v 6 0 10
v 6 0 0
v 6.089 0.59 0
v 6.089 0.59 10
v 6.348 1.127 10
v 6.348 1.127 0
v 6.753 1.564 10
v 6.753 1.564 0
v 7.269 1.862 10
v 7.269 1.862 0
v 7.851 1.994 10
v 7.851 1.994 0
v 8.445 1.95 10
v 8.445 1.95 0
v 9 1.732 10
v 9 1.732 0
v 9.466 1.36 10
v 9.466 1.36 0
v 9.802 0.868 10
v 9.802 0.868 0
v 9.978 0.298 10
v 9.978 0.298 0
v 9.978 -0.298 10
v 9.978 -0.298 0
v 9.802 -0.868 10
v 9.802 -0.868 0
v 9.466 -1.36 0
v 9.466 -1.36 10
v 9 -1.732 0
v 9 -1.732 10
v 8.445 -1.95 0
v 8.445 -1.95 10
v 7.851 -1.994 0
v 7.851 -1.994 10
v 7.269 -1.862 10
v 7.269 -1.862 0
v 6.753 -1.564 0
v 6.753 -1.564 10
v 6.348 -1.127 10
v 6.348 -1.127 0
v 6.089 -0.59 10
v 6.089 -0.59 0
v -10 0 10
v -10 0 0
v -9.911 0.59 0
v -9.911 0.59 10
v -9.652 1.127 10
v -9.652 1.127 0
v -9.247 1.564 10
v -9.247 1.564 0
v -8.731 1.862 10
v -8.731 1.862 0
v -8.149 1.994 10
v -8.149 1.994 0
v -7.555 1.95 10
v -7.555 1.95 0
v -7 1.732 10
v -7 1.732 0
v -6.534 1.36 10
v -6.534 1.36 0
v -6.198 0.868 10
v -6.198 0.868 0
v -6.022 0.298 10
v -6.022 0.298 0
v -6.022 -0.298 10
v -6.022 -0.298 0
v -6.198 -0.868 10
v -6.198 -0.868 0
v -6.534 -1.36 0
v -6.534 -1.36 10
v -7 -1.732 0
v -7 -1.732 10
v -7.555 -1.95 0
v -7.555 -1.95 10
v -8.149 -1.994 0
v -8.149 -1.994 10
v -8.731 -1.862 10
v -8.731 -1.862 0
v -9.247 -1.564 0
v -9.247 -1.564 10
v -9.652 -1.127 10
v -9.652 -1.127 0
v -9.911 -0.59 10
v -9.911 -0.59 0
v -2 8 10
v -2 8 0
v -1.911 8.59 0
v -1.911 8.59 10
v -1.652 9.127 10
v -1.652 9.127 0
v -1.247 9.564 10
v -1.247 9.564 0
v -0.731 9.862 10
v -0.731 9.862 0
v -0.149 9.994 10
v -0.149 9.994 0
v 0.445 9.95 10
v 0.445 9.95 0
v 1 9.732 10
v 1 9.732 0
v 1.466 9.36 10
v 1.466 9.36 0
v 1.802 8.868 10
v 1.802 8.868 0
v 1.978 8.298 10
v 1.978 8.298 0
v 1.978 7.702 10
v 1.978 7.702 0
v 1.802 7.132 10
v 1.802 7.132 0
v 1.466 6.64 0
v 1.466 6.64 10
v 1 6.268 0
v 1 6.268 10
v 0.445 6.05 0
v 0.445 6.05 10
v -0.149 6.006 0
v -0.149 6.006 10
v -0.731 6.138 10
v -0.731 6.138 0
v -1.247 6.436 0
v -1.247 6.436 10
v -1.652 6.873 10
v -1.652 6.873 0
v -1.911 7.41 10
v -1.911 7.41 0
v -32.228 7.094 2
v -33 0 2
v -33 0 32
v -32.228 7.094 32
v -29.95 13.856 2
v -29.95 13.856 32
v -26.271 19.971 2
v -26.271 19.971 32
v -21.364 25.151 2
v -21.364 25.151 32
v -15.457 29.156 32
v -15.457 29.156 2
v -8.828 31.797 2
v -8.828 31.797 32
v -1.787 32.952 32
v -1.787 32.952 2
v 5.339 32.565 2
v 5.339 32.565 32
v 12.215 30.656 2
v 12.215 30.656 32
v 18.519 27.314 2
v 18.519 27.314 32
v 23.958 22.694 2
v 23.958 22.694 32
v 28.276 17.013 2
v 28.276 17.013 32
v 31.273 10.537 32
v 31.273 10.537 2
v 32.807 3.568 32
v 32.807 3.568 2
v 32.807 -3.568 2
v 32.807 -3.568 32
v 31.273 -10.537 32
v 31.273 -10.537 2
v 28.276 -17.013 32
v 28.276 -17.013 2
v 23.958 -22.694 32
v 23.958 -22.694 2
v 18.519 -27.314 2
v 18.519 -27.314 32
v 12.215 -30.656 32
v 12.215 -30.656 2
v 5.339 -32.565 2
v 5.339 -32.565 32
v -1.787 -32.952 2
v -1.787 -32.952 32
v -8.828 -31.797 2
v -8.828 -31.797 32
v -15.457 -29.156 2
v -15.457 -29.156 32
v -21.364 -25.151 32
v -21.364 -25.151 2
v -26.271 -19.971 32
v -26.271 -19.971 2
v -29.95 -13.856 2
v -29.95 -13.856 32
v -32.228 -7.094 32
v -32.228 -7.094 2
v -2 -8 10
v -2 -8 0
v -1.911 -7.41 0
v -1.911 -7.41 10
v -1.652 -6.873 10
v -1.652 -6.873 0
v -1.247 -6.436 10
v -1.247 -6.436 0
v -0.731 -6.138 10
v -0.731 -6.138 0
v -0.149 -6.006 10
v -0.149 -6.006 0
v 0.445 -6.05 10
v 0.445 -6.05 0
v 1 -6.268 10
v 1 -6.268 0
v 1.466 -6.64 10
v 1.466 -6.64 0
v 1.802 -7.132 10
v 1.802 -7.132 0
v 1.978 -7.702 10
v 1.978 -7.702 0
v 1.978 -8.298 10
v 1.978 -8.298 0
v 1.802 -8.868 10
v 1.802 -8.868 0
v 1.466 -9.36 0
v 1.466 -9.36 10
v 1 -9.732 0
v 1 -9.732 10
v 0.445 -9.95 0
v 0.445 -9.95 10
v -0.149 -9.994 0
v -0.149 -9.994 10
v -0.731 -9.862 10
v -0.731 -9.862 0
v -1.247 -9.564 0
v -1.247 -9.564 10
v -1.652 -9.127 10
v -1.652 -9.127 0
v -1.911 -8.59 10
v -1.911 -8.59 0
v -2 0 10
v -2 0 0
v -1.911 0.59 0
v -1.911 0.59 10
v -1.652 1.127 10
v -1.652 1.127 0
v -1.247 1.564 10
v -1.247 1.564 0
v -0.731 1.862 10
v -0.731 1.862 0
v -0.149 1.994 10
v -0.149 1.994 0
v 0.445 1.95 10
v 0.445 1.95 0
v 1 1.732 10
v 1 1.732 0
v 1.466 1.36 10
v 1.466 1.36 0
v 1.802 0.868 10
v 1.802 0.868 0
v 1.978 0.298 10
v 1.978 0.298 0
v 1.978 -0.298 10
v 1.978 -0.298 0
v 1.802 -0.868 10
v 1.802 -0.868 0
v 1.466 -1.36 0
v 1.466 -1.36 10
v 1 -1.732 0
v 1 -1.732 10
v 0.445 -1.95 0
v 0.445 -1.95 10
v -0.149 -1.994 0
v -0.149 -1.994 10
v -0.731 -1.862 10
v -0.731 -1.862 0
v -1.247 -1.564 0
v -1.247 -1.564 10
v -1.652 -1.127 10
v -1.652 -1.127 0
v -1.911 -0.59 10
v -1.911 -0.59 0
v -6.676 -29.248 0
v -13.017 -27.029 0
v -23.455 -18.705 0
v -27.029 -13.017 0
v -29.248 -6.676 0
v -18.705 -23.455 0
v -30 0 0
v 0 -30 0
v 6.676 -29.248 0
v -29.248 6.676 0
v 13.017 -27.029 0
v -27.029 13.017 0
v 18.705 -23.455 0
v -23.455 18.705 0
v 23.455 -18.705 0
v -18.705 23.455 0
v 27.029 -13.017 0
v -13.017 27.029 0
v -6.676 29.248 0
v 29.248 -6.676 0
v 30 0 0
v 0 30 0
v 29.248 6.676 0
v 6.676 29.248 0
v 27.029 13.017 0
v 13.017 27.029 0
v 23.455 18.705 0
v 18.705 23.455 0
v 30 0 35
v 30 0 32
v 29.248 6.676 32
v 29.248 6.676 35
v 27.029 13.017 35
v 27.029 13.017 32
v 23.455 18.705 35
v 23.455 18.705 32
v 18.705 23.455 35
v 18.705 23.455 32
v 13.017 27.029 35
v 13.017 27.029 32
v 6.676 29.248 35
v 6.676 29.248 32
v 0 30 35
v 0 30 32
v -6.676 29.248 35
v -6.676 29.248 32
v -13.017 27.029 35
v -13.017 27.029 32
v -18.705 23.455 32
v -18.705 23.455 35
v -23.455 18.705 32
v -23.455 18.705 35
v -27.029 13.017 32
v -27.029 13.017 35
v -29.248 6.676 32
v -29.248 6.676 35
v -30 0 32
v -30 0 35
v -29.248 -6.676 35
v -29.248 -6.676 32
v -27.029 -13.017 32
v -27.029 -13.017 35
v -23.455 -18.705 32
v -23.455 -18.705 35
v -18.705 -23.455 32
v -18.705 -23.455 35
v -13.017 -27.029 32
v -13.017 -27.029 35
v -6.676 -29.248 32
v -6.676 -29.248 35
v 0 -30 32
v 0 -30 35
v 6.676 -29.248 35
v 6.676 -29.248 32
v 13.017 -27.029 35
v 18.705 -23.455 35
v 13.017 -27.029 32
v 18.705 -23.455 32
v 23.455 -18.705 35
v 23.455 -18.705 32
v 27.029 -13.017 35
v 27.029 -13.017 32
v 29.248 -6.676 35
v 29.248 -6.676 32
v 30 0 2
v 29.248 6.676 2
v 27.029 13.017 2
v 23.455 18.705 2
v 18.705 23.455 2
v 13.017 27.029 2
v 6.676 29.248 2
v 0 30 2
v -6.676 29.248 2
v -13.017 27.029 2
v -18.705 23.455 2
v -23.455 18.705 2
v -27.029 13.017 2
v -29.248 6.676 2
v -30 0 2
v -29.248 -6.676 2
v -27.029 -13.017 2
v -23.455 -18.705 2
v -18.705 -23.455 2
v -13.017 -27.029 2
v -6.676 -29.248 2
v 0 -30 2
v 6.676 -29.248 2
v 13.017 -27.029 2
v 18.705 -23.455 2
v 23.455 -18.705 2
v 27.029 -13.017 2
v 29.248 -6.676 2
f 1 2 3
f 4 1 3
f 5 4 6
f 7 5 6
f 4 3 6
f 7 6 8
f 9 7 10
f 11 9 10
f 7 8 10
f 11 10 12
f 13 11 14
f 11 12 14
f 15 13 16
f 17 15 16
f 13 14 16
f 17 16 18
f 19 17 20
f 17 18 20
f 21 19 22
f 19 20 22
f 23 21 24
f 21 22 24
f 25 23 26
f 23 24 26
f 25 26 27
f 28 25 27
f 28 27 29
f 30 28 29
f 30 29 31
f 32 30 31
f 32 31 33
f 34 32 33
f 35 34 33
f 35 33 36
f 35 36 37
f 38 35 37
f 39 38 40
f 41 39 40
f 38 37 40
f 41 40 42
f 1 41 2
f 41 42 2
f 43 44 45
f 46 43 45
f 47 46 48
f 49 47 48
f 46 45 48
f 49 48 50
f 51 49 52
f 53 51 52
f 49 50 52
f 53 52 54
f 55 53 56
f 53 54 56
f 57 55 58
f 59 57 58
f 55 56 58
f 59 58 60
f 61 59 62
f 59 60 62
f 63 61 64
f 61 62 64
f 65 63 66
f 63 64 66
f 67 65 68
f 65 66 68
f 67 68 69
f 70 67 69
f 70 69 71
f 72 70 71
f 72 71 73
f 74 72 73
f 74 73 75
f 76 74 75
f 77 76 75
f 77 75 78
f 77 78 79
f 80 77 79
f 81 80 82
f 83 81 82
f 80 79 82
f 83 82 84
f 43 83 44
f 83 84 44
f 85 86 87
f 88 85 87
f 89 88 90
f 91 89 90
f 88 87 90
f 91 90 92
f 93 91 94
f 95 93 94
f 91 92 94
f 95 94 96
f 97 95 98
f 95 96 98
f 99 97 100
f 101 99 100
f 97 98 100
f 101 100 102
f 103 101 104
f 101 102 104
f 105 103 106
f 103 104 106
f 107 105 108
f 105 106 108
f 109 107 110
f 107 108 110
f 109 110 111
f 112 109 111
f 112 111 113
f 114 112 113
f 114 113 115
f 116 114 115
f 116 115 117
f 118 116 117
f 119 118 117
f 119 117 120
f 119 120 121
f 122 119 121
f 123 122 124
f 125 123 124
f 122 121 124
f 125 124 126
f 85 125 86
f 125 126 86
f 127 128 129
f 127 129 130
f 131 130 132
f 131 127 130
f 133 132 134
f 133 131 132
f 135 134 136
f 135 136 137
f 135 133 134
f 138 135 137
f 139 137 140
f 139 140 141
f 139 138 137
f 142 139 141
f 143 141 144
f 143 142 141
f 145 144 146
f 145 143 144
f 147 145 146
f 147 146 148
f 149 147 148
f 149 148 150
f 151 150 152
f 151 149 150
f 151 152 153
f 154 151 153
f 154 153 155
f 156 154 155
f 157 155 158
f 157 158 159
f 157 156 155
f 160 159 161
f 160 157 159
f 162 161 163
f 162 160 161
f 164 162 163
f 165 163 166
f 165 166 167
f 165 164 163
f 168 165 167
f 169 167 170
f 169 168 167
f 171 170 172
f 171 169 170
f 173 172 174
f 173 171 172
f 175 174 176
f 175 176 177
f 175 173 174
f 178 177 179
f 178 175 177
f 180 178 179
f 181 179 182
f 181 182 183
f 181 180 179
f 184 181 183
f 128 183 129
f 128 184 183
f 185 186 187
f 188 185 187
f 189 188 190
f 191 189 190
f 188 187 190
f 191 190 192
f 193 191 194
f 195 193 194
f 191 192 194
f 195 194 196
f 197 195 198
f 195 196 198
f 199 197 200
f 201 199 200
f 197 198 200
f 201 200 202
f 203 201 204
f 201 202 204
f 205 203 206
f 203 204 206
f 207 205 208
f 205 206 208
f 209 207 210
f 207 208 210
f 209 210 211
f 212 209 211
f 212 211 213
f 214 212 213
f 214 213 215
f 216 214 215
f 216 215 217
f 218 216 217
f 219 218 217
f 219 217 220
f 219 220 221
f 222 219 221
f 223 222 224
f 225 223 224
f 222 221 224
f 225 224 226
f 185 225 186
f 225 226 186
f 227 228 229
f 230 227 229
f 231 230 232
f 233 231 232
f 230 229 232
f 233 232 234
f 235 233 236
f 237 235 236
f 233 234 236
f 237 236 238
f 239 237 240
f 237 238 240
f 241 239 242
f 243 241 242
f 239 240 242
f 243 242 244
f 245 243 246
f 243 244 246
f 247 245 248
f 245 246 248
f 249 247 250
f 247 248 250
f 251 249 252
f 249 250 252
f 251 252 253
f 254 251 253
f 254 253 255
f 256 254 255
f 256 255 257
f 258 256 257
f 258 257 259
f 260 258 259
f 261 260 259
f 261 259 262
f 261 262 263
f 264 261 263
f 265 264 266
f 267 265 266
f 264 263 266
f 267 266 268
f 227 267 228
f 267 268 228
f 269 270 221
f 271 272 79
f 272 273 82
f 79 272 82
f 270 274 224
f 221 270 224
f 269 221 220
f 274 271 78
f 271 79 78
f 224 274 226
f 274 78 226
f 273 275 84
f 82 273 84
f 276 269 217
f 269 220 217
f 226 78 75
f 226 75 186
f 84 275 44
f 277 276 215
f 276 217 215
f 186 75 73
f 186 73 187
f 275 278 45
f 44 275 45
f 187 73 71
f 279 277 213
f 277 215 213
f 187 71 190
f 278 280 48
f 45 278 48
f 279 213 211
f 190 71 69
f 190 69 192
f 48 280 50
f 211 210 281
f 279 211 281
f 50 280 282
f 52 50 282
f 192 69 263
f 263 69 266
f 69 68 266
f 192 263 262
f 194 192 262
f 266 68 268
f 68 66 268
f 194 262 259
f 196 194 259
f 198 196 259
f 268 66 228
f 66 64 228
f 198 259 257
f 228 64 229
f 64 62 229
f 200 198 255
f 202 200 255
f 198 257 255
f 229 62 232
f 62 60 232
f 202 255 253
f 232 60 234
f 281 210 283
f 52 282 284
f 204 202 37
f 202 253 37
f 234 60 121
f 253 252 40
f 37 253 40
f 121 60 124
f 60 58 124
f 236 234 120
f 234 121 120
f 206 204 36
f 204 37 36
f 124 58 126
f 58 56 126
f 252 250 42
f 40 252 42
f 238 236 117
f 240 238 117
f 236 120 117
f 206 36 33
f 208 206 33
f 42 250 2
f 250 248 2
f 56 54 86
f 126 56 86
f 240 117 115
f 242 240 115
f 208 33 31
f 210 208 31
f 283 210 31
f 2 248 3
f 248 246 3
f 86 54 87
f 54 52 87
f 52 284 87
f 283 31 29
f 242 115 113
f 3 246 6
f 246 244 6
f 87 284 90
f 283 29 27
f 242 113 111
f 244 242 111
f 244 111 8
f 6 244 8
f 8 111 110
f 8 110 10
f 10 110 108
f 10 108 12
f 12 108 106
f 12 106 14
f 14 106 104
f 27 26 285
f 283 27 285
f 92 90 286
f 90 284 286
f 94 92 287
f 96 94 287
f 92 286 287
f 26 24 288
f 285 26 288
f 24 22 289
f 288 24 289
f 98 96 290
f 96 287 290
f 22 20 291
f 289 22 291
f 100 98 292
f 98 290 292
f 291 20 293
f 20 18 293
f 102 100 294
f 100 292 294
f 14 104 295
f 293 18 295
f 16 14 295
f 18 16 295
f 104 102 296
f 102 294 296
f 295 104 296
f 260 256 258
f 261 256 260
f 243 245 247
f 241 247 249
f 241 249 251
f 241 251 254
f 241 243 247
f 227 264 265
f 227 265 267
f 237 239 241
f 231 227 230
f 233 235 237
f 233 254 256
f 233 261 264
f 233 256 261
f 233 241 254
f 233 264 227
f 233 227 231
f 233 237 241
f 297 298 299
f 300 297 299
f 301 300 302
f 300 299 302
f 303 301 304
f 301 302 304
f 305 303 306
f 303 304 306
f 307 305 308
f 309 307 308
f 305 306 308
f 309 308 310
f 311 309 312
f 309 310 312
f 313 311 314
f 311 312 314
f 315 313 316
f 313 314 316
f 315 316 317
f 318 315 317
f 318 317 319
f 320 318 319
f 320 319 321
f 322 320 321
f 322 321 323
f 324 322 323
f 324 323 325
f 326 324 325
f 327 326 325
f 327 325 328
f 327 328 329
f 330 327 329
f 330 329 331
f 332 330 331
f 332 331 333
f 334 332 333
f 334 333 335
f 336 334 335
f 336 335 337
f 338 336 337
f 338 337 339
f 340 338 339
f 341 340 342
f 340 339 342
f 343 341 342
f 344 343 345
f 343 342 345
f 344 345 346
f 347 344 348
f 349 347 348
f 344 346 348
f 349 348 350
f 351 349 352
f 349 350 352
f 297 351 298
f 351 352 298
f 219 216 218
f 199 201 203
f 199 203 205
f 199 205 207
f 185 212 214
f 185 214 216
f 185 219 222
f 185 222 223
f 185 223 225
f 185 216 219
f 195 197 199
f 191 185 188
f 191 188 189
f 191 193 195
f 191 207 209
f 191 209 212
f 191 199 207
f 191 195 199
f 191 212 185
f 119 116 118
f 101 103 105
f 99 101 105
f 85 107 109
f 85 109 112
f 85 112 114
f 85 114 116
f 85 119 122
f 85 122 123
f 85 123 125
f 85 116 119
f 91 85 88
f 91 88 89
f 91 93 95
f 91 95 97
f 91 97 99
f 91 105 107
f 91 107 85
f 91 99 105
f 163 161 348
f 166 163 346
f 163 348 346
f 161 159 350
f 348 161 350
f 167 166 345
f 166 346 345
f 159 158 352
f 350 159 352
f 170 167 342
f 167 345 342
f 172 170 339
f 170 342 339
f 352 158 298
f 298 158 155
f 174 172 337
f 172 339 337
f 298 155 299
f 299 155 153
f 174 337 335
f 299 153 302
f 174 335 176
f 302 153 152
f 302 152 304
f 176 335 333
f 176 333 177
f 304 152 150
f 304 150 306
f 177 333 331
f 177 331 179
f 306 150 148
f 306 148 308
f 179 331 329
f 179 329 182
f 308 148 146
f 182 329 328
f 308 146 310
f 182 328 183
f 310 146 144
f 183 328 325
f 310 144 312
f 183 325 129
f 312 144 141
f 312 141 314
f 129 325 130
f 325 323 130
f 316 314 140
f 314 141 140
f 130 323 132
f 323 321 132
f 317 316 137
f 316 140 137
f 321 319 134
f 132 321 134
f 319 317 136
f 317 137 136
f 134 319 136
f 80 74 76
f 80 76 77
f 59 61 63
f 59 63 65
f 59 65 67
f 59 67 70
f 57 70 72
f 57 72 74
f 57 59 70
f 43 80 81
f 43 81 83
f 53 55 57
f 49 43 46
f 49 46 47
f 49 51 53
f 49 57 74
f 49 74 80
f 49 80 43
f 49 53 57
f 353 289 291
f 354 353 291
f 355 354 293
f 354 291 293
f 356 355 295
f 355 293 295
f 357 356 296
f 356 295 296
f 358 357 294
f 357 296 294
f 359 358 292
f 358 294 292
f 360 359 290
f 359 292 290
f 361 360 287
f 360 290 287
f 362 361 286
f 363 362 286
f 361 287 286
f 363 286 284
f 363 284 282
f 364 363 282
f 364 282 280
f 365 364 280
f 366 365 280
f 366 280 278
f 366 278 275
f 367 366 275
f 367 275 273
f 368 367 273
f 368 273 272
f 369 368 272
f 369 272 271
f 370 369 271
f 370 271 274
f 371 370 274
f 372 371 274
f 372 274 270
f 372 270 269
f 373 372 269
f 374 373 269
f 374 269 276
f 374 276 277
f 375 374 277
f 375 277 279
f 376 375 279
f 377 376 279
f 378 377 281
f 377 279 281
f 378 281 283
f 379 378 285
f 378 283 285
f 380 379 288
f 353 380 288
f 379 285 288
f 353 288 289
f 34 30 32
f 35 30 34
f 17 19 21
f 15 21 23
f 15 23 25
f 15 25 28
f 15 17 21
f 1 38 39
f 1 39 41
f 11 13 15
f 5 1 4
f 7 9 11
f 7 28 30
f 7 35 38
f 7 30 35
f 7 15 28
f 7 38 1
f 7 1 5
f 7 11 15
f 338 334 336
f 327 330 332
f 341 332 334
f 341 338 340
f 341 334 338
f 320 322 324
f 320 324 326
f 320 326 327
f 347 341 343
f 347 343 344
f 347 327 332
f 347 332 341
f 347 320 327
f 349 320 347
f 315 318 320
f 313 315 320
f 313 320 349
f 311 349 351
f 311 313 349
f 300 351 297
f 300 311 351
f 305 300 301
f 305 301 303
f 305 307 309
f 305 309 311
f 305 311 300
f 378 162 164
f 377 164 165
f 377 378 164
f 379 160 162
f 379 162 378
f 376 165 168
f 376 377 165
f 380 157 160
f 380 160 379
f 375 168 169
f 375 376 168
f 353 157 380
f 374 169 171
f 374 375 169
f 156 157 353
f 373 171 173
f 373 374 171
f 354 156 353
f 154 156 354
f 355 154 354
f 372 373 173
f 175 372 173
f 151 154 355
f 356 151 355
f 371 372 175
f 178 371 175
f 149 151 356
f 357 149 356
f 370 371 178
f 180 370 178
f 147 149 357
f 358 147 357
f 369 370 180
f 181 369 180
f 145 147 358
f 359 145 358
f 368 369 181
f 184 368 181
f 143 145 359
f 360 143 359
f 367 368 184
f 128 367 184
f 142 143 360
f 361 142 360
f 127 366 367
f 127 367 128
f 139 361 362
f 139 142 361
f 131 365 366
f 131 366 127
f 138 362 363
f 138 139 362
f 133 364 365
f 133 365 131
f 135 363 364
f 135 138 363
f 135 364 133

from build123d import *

# Parameters (mm, degrees)
ESQUISSE1_R             = 30
BOSS_EXTRU_1_DEPTH      = 35
ESQUISSE2_R             = 2
ENL_V_MAT_EXTRU_1_DEPTH = 10
BOSS_EXTRU_2_START      = -2
ESQUISSE3_R             = 33
ESQUISSE3_R_2           = 30
BOSS_EXTRU_2_DEPTH      = 30


with BuildPart() as part:
    # Esquisse1 → Boss.-Extru.1 (new body)
    with BuildSketch(Plane.XY):
        Circle(ESQUISSE1_R)
    extrude(amount=BOSS_EXTRU_1_DEPTH)

    # Esquisse2 → Enlèv. mat.-Extru.1 (cut)
    with BuildSketch(Plane(origin=(0, 0, 0), x_dir=(-1, 0, 0), z_dir=(0, 0, -1))):
        with Locations((0, 8)):
            Circle(ESQUISSE2_R)
        with Locations((8, 0)):
            Circle(ESQUISSE2_R)
        with Locations((0, -8)):
            Circle(ESQUISSE2_R)
        with Locations((-8, 0)):
            Circle(ESQUISSE2_R)
        Circle(ESQUISSE2_R)
    extrude(amount=-ENL_V_MAT_EXTRU_1_DEPTH, mode=Mode.SUBTRACT)

    # Esquisse3 → Boss.-Extru.2 (add)
    with BuildSketch(Plane(origin=(0, 0, 0), x_dir=(-1, 0, 0), z_dir=(0, 0, -1)).offset(BOSS_EXTRU_2_START)):
        Circle(ESQUISSE3_R)
        Circle(ESQUISSE3_R_2, mode=Mode.SUBTRACT)
    extrude(amount=-BOSS_EXTRU_2_DEPTH)


solid = part.part
